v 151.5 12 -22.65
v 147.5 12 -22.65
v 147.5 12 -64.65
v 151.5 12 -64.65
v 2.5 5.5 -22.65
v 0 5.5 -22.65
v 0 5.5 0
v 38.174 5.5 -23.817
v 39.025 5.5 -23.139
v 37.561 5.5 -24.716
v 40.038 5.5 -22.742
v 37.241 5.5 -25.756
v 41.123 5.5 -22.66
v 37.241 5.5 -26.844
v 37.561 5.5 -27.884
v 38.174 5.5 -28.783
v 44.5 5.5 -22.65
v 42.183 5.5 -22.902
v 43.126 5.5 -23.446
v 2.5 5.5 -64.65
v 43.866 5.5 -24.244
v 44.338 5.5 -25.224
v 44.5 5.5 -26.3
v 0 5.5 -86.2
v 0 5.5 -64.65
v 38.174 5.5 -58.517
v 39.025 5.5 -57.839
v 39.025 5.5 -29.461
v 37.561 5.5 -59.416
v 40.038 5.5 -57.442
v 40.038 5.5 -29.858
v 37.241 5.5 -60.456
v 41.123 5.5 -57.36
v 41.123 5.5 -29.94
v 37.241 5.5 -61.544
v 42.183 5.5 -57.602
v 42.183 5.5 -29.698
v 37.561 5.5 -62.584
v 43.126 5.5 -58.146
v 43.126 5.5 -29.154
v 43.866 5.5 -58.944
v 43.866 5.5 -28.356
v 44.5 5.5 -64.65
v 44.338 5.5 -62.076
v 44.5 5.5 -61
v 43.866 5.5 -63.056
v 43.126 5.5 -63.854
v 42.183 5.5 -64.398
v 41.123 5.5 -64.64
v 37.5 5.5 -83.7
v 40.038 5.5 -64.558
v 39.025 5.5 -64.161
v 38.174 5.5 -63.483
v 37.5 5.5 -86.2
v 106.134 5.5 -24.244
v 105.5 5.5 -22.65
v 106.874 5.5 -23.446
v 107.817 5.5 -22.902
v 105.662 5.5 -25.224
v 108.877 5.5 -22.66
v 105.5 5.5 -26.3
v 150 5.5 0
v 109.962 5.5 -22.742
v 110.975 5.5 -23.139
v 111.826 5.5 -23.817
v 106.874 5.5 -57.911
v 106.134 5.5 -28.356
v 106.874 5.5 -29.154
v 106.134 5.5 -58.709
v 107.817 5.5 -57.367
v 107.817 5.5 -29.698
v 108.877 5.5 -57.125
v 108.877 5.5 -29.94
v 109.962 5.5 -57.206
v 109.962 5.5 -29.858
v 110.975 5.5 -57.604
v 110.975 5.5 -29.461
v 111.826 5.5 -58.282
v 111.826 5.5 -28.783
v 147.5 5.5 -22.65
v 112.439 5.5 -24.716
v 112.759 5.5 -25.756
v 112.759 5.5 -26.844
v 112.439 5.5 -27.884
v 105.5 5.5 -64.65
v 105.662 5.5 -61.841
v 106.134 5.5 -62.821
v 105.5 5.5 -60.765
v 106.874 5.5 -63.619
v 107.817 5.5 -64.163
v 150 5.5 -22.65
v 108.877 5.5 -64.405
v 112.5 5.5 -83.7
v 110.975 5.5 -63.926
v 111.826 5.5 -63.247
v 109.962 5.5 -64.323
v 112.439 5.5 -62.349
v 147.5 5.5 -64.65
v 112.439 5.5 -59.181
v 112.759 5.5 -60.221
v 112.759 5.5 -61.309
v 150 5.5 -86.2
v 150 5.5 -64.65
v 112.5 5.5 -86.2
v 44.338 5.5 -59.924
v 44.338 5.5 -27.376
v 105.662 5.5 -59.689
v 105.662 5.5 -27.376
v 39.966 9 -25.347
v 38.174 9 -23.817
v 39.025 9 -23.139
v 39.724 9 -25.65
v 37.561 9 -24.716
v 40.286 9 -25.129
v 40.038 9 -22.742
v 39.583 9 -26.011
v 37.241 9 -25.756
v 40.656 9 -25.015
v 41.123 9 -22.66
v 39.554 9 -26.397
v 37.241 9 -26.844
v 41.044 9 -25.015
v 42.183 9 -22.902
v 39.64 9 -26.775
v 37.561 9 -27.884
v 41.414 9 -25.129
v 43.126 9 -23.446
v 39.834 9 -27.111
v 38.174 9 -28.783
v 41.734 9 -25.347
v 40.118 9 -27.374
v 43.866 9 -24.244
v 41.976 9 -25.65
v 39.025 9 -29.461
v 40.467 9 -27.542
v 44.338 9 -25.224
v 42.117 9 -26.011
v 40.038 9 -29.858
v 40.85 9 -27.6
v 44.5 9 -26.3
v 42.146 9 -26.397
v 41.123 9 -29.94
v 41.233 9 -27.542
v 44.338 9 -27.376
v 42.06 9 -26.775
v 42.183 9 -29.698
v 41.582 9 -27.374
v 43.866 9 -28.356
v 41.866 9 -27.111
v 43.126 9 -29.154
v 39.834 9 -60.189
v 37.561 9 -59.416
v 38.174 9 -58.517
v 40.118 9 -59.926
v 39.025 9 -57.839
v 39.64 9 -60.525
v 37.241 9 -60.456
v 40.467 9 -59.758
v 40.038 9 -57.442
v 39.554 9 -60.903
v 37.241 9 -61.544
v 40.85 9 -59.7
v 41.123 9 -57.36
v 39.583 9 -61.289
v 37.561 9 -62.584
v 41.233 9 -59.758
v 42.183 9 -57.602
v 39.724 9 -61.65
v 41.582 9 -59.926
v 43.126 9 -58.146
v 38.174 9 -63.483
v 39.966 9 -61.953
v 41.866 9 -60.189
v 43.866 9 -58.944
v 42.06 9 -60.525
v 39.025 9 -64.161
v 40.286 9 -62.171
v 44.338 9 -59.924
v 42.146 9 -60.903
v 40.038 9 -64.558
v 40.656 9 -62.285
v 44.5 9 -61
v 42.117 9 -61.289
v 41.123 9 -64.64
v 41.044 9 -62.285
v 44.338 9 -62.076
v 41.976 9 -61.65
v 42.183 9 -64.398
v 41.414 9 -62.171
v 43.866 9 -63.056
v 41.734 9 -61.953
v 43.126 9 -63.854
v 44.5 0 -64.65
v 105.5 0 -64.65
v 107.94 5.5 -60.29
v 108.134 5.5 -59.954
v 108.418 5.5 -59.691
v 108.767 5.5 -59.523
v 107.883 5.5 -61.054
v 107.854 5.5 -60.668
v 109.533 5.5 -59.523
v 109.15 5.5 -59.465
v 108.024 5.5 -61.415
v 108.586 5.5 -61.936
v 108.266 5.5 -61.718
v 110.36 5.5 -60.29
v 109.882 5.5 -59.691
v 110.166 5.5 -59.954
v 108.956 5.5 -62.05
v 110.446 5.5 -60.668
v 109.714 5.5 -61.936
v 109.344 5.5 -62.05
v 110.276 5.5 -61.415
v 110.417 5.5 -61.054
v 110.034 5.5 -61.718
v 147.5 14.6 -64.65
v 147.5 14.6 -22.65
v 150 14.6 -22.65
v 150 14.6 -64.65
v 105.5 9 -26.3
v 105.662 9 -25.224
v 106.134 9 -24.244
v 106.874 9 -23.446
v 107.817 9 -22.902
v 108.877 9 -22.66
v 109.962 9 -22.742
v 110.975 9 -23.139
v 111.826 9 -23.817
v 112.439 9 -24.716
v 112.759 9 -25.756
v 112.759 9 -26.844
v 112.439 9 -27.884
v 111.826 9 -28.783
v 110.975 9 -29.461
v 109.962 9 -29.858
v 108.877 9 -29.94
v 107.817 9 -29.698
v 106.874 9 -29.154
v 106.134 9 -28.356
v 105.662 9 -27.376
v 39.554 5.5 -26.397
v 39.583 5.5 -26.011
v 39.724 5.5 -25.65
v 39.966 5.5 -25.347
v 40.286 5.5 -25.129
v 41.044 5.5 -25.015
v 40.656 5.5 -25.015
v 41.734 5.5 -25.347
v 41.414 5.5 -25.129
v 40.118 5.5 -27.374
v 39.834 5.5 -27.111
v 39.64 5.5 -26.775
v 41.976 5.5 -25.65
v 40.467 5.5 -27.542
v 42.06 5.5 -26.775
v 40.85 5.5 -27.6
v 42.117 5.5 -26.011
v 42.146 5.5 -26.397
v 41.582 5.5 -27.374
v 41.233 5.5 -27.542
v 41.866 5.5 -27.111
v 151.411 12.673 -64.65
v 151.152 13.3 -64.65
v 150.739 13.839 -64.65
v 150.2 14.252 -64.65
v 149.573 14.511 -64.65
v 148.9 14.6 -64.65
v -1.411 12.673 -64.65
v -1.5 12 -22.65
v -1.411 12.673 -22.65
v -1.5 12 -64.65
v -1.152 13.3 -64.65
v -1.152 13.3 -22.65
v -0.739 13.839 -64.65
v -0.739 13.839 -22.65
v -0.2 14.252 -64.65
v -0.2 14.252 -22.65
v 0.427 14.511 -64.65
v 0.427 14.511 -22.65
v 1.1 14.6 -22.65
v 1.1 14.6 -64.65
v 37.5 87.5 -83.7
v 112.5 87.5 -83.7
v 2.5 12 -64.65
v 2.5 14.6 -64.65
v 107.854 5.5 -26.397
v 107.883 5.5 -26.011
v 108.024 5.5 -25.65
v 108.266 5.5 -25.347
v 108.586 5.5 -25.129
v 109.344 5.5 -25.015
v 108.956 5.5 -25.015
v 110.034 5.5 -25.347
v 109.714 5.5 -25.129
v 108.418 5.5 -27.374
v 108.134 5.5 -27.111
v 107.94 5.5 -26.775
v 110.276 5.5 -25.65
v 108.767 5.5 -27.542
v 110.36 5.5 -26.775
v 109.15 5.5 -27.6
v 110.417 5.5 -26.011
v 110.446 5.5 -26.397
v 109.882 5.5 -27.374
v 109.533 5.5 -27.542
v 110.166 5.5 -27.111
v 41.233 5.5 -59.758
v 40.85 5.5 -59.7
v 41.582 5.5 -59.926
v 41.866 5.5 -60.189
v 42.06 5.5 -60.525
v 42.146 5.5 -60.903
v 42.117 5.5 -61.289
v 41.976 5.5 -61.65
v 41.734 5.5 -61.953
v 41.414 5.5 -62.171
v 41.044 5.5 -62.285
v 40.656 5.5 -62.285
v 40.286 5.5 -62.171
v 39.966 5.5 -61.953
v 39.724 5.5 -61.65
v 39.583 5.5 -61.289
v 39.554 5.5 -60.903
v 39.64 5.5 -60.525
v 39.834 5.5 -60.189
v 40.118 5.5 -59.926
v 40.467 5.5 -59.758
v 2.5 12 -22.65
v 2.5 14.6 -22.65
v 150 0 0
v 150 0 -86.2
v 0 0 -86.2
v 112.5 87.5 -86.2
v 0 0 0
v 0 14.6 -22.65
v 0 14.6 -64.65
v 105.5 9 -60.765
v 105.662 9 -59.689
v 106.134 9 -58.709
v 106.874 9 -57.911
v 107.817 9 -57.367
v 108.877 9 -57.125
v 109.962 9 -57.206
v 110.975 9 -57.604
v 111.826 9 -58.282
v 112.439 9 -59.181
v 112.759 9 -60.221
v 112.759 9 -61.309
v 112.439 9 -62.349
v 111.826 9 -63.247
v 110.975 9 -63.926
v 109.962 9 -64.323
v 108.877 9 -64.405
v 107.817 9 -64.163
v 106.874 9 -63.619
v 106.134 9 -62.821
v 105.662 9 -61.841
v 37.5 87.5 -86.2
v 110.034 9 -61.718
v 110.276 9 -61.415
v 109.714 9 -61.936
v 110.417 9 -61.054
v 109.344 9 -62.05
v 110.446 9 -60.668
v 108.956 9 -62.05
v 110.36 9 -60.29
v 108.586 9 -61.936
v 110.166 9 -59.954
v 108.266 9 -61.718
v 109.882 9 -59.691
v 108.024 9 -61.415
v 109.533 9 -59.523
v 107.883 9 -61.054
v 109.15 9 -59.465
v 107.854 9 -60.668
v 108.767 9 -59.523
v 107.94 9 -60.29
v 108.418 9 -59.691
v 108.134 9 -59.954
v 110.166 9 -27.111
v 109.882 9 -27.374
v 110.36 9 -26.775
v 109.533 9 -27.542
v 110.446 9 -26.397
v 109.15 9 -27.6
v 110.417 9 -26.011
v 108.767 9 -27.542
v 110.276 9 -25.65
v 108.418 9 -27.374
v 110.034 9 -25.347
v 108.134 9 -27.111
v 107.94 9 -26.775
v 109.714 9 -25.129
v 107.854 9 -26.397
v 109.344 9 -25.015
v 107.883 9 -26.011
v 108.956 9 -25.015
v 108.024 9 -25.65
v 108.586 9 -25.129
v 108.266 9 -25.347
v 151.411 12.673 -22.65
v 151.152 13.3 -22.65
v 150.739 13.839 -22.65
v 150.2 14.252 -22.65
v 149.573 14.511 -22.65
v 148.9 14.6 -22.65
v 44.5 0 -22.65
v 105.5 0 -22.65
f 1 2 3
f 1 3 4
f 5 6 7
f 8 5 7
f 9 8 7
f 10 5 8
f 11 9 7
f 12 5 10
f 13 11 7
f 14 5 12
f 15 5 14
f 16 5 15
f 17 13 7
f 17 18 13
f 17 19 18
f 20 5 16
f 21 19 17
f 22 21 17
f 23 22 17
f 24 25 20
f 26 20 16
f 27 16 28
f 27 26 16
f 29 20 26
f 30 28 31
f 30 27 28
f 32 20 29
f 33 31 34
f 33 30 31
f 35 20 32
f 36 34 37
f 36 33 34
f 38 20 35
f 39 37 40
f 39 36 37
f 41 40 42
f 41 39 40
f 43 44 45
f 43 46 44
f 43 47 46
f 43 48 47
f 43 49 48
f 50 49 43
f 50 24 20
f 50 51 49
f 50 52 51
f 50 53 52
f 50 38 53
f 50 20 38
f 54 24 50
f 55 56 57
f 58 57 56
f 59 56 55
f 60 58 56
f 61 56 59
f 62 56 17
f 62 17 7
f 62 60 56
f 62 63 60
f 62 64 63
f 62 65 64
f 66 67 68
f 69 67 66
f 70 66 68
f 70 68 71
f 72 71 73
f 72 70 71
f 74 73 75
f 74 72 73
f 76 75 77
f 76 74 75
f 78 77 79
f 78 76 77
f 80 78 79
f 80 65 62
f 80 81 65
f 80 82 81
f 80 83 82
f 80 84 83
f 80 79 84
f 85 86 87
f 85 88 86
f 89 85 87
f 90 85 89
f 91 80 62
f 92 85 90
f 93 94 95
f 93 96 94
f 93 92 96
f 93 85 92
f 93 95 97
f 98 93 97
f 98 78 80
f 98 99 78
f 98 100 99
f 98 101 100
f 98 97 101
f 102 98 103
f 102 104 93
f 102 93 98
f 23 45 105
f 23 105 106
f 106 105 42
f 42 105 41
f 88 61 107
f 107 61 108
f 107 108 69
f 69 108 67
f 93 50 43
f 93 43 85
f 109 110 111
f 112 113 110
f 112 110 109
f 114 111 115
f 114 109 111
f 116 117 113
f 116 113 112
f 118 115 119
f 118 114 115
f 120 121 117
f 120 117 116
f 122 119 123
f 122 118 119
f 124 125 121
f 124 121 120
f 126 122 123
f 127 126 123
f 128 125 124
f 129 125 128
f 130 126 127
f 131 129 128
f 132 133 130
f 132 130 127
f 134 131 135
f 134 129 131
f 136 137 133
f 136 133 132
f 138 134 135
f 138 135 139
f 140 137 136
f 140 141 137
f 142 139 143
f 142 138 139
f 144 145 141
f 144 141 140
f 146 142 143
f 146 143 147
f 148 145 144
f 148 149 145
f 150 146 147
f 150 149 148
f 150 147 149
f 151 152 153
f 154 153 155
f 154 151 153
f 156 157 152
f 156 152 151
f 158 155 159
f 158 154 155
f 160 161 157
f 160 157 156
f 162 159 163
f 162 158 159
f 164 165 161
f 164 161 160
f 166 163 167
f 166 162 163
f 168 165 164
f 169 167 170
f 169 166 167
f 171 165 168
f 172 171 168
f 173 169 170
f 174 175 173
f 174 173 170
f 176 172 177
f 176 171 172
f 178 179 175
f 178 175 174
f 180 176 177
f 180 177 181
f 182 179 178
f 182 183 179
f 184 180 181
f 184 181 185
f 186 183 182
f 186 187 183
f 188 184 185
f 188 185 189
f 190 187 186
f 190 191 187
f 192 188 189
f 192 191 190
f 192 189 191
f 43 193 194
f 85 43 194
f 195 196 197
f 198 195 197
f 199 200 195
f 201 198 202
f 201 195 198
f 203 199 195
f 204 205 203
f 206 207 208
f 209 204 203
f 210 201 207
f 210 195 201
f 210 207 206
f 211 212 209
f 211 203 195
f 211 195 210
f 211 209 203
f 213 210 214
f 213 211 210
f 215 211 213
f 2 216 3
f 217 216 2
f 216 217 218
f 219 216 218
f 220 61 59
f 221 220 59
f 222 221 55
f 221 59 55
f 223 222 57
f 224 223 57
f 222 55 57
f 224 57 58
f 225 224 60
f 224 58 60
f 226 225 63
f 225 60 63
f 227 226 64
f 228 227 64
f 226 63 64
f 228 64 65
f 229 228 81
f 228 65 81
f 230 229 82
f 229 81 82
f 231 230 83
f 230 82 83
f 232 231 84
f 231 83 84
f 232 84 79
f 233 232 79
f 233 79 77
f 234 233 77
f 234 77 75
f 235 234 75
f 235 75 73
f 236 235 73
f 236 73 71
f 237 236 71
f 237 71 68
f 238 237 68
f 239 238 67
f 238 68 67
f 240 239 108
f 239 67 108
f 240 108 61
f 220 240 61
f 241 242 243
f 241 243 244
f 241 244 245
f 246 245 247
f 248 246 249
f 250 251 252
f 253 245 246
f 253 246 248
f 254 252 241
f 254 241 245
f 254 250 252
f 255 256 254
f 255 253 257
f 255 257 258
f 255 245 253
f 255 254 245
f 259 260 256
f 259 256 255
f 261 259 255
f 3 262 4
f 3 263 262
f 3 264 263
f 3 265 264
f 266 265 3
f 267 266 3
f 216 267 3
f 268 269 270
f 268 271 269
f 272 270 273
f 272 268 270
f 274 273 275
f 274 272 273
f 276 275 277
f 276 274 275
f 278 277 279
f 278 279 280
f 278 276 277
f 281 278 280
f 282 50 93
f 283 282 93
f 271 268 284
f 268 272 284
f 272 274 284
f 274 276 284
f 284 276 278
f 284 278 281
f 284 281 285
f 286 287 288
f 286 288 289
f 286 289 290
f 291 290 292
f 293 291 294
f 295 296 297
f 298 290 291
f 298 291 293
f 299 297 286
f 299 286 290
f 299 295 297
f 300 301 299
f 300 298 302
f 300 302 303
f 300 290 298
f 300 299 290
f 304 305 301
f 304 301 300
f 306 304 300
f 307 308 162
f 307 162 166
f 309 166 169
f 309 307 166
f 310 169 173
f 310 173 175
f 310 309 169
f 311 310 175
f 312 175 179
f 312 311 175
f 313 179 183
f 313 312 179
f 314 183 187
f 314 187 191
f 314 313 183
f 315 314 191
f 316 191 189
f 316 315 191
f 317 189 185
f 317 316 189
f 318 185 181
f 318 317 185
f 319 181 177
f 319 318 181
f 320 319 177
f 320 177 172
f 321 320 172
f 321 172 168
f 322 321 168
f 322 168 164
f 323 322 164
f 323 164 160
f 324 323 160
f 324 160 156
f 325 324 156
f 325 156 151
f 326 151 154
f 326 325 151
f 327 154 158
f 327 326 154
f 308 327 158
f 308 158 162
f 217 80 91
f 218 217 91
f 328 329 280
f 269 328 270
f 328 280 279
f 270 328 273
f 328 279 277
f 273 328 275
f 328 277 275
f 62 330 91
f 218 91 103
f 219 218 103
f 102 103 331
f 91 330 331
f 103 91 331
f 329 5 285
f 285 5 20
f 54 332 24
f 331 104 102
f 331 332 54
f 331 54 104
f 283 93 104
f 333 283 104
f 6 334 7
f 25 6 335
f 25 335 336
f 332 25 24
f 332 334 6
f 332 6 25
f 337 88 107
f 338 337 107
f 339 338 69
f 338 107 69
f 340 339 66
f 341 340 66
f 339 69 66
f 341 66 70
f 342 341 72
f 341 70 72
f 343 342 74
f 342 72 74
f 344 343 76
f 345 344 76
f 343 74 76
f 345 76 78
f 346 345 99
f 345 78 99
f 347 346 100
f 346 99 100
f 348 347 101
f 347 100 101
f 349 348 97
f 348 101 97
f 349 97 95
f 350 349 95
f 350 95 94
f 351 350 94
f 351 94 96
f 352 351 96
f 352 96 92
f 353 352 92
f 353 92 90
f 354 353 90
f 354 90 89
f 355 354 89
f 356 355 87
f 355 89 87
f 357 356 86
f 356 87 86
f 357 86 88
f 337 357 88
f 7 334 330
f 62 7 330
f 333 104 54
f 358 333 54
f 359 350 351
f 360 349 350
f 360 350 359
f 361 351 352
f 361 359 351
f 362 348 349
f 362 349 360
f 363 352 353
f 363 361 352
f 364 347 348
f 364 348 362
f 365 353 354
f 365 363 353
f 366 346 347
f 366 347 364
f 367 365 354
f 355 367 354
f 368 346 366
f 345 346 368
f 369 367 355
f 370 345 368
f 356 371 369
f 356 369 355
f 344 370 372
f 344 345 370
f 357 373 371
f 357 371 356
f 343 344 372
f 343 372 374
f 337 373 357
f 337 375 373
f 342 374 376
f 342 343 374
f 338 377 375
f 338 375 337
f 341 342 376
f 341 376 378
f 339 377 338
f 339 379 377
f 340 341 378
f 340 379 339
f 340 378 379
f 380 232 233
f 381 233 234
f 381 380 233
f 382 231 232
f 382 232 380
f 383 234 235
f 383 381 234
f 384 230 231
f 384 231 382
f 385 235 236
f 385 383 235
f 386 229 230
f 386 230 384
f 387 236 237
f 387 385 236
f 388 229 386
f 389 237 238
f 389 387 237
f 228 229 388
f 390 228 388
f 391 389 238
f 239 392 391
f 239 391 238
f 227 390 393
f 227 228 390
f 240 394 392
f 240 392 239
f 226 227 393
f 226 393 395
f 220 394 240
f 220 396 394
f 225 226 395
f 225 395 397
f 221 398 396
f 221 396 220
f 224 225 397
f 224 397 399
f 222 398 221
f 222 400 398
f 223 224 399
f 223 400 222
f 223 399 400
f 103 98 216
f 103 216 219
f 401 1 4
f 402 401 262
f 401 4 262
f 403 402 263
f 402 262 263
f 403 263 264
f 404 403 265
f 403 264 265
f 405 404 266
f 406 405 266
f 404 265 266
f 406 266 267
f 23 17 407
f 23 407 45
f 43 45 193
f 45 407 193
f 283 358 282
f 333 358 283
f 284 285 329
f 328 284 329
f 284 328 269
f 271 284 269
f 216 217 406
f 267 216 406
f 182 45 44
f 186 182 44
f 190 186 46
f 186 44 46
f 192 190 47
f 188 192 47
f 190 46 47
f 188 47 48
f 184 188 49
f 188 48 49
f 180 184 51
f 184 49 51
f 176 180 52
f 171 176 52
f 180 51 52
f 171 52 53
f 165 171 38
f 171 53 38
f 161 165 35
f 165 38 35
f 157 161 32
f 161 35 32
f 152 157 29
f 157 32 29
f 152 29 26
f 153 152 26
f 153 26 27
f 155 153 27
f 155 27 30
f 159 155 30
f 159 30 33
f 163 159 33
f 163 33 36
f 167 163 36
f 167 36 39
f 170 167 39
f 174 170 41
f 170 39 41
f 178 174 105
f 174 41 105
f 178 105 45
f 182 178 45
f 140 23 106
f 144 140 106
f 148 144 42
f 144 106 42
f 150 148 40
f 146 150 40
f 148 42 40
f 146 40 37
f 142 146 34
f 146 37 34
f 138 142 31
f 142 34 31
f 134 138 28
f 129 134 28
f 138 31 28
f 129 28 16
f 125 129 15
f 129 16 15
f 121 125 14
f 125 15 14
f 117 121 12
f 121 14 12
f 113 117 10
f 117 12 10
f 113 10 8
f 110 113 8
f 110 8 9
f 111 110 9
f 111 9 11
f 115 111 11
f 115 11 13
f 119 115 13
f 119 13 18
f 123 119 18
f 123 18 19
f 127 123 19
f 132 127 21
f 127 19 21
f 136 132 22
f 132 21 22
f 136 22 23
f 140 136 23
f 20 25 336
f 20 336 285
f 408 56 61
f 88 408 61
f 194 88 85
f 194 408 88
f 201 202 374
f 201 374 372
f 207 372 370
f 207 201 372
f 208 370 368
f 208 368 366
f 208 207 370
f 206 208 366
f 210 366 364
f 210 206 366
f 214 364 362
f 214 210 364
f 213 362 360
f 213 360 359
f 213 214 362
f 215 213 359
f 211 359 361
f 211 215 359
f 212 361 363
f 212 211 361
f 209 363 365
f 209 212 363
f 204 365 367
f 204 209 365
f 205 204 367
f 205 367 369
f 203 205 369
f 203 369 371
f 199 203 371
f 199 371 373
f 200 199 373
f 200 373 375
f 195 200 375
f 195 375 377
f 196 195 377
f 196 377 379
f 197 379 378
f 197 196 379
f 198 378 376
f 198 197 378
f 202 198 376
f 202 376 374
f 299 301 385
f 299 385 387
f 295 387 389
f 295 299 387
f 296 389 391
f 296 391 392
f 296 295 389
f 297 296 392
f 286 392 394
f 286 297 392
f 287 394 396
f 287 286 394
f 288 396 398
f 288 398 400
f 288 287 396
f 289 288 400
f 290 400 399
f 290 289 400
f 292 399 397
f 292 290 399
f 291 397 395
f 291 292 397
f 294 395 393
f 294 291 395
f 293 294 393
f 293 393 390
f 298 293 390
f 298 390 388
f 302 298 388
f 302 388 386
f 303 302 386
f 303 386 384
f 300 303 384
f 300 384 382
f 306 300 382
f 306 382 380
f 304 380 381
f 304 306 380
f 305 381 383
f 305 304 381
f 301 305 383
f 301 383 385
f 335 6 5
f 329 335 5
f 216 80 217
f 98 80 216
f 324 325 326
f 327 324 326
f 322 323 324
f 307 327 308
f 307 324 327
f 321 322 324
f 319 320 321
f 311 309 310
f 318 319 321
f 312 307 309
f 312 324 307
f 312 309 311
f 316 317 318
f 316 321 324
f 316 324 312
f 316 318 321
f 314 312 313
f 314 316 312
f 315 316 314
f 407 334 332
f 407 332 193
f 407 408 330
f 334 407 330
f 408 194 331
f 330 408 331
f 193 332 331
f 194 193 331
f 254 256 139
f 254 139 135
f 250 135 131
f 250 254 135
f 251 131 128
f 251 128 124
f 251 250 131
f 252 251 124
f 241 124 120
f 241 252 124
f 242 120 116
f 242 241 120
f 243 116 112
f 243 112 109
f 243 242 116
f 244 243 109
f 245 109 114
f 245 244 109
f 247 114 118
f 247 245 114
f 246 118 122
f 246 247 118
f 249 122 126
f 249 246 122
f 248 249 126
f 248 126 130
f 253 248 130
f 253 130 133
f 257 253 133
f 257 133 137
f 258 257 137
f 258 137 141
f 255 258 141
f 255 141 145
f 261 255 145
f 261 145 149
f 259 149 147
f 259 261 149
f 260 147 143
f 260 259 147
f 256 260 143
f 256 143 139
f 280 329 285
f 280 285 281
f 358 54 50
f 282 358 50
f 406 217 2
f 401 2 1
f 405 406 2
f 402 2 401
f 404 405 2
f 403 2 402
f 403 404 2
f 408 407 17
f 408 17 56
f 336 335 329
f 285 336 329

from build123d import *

# Parameters (mm, degrees)
ESBO_O1_W                  = 150
ESBO_O1_H                  = 86.2
ESBO_O1_W_2                = 61
ESBO_O1_H_2                = 42
RESSALTO_EXTRUS_O1_DEPTH   = 5.5
ESBO_O2_W                  = 2.5
ESBO_O2_H                  = 42
RESSALTO_EXTRUS_O2_DEPTH   = 14.6
RESSALTO_EXTRUS_O3_DEPTH   = 2.6
RESSALTO_EXTRUS_O3_2_DEPTH = 2.6
FILETE3_R                  = 2.6
FILETE4_R                  = 2.6
F_3DSKETCH3_R              = 3.65
F_3DSKETCH3_R_2            = 1.3
RESSALTO_EXTRUS_O4_DEPTH   = 3.5
RESSALTO_EXTRUS_O5_DEPTH   = 82


with BuildPart() as part:
    # Esboço1 → Ressalto-extrusão1 (new body)
    with BuildSketch(Plane(origin=(0, 0, 0), x_dir=(1, 0, 0), z_dir=(0, 1, 0))):
        with Locations((75, 43.1)):
            Rectangle(ESBO_O1_W, ESBO_O1_H)
        with Locations((75, 43.65)):
            Rectangle(ESBO_O1_W_2, ESBO_O1_H_2, mode=Mode.SUBTRACT)
    extrude(amount=RESSALTO_EXTRUS_O1_DEPTH)

    # Esboço2 → Ressalto-extrusão2 (add)
    with BuildSketch(Plane(origin=(0, 0, 0), x_dir=(1, 0, 0), z_dir=(0, 1, 0))):
        with Locations((1.25, 43.65)):
            Rectangle(ESBO_O2_W, ESBO_O2_H)
        with Locations((148.75, 43.65)):
            Rectangle(ESBO_O2_W, ESBO_O2_H)
    extrude(amount=RESSALTO_EXTRUS_O2_DEPTH)

    # 3DSketch3 → Ressalto-extrusão4 (add)
    # profile 1 of 4: a face of its own
    with BuildSketch(Plane(origin=(109.15, 5.5, -26.3), x_dir=(-0.8915370353260333, 0, -0.45294780564880466), z_dir=(0, 1, 0))):
        with Locations(Location((0, 0, 0), (0, 0, 26.932969981))):
            Circle(F_3DSKETCH3_R)
        with Locations(Location((0, 0, 0), (0, 0, 296.932969981))):
            Circle(F_3DSKETCH3_R_2, mode=Mode.SUBTRACT)
    # profile 2 of 4: a face of its own
    with BuildSketch(Plane(origin=(109.15, 5.5, -26.3), x_dir=(-0.8915370353260333, 0, -0.45294780564880466), z_dir=(0, 1, 0))):
        with Locations(Location((15.610778124, -30.726690082, 0), (0, 0, 26.932969981))):
            Circle(F_3DSKETCH3_R)
        with Locations(Location((15.610778124, -30.726690082, 0), (0, 0, 116.932969981))):
            Circle(F_3DSKETCH3_R_2, mode=Mode.SUBTRACT)
    # profile 3 of 4: a face of its own
    with BuildSketch(Plane(origin=(109.15, 5.5, -26.3), x_dir=(-0.8915370353260333, 0, -0.45294780564880466), z_dir=(0, 1, 0))):
        with Locations(Location((60.891979513, 30.936335126, 0), (0, 0, 206.932969981))):
            Circle(F_3DSKETCH3_R)
        with Locations(Location((60.891979513, 30.936335126, 0), (0, 0, 296.932969981))):
            Circle(F_3DSKETCH3_R_2, mode=Mode.SUBTRACT)
    # profile 4 of 4: a face of its own
    with BuildSketch(Plane(origin=(109.15, 5.5, -26.3), x_dir=(-0.8915370353260333, 0, -0.45294780564880466), z_dir=(0, 1, 0))):
        with Locations(Location((76.609268369, 0, 0), (0, 0, 206.932969981))):
            Circle(F_3DSKETCH3_R)
        with Locations(Location((76.609268369, 0, 0), (0, 0, 116.932969981))):
            Circle(F_3DSKETCH3_R_2, mode=Mode.SUBTRACT)
    extrude(amount=RESSALTO_EXTRUS_O4_DEPTH)

    # 3DSketch4 → Ressalto-extrusão5 (add)
    with BuildSketch(Plane(origin=(112.5, 5.5, -86.2), x_dir=(-0.9994449069791543, 0, 0.03331483023263851), z_dir=(0, -1, 0))):
        Polygon((0, 0), (74.958368023, 2.498612267), (75.041655099, 0), (0.083287076, -2.498612267), align=None)
    extrude(amount=-RESSALTO_EXTRUS_O5_DEPTH)


with BuildPart() as body_2:
    # 3DSketch2 → Ressalto-extrusão3 (new body)
    with BuildSketch(Plane(origin=(147.5, 14.6, -22.65), x_dir=(-0.962492938133368, 0, -0.27130673423893603), z_dir=(0, -1, 0))):
        Polygon((0, 0), (-3.849971753, 1.085226937), (7.544911086, 41.509930339), (11.394882838, 40.424703402), align=None)
    extrude(amount=RESSALTO_EXTRUS_O3_DEPTH)

    # Filete4
    filete4_edges = [body_2.edges().sort_by_distance(p)[0] for p in [
        (151.5, 14.6, -43.65),
    ]]
    fillet(filete4_edges, radius=FILETE4_R - 0.0001)  # a hair under: the kernel refuses the full size


with BuildPart() as body_3:
    # 3DSketch2 → Ressalto-extrus_o3 2 (new body)
    with BuildSketch(Plane(origin=(147.5, 14.6, -22.65), x_dir=(-0.962492938133368, 0, -0.27130673423893603), z_dir=(0, -1, 0))):
        Polygon((139.561476029, -39.339476465), (143.411447782, -40.424703402), (154.80633062, 0), (150.956358867, 1.085226937), align=None)
    extrude(amount=RESSALTO_EXTRUS_O3_2_DEPTH)

    # Filete3
    filete3_edges = [body_3.edges().sort_by_distance(p)[0] for p in [
        (-1.5, 14.6, -43.65),
    ]]
    fillet(filete3_edges, radius=FILETE3_R - 0.0001)  # a hair under: the kernel refuses the full size


solid = Compound([part.part, body_2.part, body_3.part])
